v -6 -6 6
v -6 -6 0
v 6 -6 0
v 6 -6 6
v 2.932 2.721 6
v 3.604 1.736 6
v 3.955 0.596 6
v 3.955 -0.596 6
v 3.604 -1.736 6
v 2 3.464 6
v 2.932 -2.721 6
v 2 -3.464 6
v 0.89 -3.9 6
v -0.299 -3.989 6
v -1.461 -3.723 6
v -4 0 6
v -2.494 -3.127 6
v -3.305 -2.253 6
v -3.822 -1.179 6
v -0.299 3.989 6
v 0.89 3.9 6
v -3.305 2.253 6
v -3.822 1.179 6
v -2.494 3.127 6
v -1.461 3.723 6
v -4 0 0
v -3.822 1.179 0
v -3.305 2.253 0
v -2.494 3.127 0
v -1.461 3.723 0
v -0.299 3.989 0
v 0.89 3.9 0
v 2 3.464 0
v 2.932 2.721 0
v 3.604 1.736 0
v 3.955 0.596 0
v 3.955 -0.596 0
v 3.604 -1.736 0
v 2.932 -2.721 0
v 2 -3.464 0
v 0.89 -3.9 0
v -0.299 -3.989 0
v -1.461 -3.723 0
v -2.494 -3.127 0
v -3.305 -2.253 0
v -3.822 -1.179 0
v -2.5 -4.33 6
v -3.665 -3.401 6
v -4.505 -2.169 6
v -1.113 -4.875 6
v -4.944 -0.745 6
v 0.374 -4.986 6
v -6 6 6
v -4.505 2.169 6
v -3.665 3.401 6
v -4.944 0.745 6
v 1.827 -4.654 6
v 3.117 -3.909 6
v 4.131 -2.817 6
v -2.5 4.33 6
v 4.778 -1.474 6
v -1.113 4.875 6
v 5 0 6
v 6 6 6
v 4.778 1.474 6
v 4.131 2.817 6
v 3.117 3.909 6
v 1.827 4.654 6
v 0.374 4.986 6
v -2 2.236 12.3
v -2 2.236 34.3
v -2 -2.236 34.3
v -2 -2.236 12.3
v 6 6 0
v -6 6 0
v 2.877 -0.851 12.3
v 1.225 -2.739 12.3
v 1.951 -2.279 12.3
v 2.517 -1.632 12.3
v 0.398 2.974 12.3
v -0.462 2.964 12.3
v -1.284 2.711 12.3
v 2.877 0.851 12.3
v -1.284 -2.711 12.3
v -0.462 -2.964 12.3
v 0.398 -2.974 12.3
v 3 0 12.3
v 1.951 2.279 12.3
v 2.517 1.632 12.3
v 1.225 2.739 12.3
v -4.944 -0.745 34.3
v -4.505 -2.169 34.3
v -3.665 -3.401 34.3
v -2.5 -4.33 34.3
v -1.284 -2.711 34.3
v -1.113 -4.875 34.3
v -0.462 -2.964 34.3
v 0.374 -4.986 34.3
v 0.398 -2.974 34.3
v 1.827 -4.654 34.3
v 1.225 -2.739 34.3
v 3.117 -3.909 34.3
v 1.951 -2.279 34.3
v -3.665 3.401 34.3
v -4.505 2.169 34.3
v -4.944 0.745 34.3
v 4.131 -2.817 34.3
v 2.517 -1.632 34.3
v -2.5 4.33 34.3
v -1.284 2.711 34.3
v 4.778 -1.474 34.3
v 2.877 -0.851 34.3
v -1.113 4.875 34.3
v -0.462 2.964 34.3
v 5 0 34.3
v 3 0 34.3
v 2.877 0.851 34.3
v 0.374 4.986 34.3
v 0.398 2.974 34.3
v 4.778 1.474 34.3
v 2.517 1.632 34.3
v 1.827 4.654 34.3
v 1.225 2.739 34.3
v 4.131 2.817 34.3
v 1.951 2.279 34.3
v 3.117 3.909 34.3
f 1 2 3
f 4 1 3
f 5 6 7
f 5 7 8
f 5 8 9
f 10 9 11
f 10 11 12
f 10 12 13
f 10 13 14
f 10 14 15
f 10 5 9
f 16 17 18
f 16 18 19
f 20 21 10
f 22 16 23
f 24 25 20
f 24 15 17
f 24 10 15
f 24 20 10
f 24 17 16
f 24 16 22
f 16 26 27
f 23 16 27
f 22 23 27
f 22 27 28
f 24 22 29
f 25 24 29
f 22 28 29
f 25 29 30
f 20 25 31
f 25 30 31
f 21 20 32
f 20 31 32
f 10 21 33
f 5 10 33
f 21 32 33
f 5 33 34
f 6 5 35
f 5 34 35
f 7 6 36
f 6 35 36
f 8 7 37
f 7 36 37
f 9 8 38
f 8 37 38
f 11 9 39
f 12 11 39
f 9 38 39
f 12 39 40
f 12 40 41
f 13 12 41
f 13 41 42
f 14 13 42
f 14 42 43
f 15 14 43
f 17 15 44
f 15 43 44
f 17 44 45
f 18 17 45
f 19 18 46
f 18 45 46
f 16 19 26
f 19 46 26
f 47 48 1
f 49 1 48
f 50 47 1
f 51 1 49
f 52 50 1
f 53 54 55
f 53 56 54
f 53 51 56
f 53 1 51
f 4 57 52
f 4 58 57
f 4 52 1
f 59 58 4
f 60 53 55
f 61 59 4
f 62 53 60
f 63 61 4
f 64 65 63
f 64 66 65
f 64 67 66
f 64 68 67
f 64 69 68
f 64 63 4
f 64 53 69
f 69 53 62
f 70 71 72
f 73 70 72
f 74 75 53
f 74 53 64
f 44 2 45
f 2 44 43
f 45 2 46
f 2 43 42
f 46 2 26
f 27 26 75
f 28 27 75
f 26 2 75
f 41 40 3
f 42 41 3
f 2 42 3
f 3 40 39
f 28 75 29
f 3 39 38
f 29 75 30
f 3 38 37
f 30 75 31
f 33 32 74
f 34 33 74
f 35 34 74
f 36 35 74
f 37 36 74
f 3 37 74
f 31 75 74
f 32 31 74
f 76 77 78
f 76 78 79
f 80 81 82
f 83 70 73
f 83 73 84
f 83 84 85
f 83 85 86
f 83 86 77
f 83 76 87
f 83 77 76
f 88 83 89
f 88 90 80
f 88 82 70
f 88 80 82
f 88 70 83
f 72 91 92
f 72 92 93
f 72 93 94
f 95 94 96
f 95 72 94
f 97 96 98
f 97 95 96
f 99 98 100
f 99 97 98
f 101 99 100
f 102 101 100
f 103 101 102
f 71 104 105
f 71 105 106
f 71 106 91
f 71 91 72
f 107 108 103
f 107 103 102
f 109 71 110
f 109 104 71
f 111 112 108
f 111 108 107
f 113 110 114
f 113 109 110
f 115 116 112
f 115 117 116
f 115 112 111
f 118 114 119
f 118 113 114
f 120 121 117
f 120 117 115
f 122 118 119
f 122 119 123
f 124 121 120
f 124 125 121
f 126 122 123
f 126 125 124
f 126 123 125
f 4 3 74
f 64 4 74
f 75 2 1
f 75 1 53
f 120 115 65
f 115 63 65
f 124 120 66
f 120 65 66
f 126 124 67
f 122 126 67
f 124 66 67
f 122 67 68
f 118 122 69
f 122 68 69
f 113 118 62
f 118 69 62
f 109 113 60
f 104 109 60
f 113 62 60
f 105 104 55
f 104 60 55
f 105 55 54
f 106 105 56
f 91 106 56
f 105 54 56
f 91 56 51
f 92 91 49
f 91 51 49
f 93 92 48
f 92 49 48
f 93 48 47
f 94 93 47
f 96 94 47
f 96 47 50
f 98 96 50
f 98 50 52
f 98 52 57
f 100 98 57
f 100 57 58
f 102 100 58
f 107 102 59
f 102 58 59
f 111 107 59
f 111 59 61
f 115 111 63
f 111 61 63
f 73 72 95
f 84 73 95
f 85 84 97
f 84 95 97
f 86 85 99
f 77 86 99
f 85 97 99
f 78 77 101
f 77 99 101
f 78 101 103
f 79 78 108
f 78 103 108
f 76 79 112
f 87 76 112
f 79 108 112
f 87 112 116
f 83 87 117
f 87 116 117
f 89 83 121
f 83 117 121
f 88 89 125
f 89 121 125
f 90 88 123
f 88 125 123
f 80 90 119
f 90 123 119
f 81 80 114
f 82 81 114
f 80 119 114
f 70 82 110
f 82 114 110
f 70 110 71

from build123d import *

# Parameters (mm, degrees)
SKETCH1_W           = 12
SKETCH1_H           = 12
BOSS_EXTRUDE1_DEPTH = 6
SKETCH2_R           = 5
BOSS_EXTRUDE2_DEPTH = 10
SKETCH3_R           = 5
BOSS_EXTRUDE3_DEPTH = 18.3
CUT_EXTRUDE2_DEPTH  = 22
SKETCH6_R           = 4
CUT_EXTRUDE3_DEPTH  = 6


with BuildPart() as part:
    # Sketch1 → Boss-Extrude1 (new body)
    with BuildSketch(Plane.XY):
        Rectangle(SKETCH1_W, SKETCH1_H)
    extrude(amount=BOSS_EXTRUDE1_DEPTH)

    # Sketch2 → Boss-Extrude2 (add)
    with BuildSketch(Plane.XY.offset(6)):
        Circle(SKETCH2_R)
    extrude(amount=BOSS_EXTRUDE2_DEPTH)

    # Sketch3 → Boss-Extrude3 (add)
    with BuildSketch(Plane.XY.offset(16)):
        Circle(SKETCH3_R)
    extrude(amount=BOSS_EXTRUDE3_DEPTH)

    # Sketch5 → Cut-Extrude2 (cut)
    with BuildSketch(Plane.XY.offset(34.3)):
        with BuildLine():
            Line((-2, 2.236067977), (-2, -2.236067977))
            ThreePointArc((-2, -2.236067977), (3, 0), (-2, 2.236067977))
        make_face()
    extrude(amount=-CUT_EXTRUDE2_DEPTH, mode=Mode.SUBTRACT)

    # Sketch6 → Cut-Extrude3 (cut)
    with BuildSketch(Plane(origin=(0, 0, 0), x_dir=(-1, 0, 0), z_dir=(0, 0, -1))):
        Circle(SKETCH6_R)
    extrude(amount=-CUT_EXTRUDE3_DEPTH, mode=Mode.SUBTRACT)


solid = part.part
